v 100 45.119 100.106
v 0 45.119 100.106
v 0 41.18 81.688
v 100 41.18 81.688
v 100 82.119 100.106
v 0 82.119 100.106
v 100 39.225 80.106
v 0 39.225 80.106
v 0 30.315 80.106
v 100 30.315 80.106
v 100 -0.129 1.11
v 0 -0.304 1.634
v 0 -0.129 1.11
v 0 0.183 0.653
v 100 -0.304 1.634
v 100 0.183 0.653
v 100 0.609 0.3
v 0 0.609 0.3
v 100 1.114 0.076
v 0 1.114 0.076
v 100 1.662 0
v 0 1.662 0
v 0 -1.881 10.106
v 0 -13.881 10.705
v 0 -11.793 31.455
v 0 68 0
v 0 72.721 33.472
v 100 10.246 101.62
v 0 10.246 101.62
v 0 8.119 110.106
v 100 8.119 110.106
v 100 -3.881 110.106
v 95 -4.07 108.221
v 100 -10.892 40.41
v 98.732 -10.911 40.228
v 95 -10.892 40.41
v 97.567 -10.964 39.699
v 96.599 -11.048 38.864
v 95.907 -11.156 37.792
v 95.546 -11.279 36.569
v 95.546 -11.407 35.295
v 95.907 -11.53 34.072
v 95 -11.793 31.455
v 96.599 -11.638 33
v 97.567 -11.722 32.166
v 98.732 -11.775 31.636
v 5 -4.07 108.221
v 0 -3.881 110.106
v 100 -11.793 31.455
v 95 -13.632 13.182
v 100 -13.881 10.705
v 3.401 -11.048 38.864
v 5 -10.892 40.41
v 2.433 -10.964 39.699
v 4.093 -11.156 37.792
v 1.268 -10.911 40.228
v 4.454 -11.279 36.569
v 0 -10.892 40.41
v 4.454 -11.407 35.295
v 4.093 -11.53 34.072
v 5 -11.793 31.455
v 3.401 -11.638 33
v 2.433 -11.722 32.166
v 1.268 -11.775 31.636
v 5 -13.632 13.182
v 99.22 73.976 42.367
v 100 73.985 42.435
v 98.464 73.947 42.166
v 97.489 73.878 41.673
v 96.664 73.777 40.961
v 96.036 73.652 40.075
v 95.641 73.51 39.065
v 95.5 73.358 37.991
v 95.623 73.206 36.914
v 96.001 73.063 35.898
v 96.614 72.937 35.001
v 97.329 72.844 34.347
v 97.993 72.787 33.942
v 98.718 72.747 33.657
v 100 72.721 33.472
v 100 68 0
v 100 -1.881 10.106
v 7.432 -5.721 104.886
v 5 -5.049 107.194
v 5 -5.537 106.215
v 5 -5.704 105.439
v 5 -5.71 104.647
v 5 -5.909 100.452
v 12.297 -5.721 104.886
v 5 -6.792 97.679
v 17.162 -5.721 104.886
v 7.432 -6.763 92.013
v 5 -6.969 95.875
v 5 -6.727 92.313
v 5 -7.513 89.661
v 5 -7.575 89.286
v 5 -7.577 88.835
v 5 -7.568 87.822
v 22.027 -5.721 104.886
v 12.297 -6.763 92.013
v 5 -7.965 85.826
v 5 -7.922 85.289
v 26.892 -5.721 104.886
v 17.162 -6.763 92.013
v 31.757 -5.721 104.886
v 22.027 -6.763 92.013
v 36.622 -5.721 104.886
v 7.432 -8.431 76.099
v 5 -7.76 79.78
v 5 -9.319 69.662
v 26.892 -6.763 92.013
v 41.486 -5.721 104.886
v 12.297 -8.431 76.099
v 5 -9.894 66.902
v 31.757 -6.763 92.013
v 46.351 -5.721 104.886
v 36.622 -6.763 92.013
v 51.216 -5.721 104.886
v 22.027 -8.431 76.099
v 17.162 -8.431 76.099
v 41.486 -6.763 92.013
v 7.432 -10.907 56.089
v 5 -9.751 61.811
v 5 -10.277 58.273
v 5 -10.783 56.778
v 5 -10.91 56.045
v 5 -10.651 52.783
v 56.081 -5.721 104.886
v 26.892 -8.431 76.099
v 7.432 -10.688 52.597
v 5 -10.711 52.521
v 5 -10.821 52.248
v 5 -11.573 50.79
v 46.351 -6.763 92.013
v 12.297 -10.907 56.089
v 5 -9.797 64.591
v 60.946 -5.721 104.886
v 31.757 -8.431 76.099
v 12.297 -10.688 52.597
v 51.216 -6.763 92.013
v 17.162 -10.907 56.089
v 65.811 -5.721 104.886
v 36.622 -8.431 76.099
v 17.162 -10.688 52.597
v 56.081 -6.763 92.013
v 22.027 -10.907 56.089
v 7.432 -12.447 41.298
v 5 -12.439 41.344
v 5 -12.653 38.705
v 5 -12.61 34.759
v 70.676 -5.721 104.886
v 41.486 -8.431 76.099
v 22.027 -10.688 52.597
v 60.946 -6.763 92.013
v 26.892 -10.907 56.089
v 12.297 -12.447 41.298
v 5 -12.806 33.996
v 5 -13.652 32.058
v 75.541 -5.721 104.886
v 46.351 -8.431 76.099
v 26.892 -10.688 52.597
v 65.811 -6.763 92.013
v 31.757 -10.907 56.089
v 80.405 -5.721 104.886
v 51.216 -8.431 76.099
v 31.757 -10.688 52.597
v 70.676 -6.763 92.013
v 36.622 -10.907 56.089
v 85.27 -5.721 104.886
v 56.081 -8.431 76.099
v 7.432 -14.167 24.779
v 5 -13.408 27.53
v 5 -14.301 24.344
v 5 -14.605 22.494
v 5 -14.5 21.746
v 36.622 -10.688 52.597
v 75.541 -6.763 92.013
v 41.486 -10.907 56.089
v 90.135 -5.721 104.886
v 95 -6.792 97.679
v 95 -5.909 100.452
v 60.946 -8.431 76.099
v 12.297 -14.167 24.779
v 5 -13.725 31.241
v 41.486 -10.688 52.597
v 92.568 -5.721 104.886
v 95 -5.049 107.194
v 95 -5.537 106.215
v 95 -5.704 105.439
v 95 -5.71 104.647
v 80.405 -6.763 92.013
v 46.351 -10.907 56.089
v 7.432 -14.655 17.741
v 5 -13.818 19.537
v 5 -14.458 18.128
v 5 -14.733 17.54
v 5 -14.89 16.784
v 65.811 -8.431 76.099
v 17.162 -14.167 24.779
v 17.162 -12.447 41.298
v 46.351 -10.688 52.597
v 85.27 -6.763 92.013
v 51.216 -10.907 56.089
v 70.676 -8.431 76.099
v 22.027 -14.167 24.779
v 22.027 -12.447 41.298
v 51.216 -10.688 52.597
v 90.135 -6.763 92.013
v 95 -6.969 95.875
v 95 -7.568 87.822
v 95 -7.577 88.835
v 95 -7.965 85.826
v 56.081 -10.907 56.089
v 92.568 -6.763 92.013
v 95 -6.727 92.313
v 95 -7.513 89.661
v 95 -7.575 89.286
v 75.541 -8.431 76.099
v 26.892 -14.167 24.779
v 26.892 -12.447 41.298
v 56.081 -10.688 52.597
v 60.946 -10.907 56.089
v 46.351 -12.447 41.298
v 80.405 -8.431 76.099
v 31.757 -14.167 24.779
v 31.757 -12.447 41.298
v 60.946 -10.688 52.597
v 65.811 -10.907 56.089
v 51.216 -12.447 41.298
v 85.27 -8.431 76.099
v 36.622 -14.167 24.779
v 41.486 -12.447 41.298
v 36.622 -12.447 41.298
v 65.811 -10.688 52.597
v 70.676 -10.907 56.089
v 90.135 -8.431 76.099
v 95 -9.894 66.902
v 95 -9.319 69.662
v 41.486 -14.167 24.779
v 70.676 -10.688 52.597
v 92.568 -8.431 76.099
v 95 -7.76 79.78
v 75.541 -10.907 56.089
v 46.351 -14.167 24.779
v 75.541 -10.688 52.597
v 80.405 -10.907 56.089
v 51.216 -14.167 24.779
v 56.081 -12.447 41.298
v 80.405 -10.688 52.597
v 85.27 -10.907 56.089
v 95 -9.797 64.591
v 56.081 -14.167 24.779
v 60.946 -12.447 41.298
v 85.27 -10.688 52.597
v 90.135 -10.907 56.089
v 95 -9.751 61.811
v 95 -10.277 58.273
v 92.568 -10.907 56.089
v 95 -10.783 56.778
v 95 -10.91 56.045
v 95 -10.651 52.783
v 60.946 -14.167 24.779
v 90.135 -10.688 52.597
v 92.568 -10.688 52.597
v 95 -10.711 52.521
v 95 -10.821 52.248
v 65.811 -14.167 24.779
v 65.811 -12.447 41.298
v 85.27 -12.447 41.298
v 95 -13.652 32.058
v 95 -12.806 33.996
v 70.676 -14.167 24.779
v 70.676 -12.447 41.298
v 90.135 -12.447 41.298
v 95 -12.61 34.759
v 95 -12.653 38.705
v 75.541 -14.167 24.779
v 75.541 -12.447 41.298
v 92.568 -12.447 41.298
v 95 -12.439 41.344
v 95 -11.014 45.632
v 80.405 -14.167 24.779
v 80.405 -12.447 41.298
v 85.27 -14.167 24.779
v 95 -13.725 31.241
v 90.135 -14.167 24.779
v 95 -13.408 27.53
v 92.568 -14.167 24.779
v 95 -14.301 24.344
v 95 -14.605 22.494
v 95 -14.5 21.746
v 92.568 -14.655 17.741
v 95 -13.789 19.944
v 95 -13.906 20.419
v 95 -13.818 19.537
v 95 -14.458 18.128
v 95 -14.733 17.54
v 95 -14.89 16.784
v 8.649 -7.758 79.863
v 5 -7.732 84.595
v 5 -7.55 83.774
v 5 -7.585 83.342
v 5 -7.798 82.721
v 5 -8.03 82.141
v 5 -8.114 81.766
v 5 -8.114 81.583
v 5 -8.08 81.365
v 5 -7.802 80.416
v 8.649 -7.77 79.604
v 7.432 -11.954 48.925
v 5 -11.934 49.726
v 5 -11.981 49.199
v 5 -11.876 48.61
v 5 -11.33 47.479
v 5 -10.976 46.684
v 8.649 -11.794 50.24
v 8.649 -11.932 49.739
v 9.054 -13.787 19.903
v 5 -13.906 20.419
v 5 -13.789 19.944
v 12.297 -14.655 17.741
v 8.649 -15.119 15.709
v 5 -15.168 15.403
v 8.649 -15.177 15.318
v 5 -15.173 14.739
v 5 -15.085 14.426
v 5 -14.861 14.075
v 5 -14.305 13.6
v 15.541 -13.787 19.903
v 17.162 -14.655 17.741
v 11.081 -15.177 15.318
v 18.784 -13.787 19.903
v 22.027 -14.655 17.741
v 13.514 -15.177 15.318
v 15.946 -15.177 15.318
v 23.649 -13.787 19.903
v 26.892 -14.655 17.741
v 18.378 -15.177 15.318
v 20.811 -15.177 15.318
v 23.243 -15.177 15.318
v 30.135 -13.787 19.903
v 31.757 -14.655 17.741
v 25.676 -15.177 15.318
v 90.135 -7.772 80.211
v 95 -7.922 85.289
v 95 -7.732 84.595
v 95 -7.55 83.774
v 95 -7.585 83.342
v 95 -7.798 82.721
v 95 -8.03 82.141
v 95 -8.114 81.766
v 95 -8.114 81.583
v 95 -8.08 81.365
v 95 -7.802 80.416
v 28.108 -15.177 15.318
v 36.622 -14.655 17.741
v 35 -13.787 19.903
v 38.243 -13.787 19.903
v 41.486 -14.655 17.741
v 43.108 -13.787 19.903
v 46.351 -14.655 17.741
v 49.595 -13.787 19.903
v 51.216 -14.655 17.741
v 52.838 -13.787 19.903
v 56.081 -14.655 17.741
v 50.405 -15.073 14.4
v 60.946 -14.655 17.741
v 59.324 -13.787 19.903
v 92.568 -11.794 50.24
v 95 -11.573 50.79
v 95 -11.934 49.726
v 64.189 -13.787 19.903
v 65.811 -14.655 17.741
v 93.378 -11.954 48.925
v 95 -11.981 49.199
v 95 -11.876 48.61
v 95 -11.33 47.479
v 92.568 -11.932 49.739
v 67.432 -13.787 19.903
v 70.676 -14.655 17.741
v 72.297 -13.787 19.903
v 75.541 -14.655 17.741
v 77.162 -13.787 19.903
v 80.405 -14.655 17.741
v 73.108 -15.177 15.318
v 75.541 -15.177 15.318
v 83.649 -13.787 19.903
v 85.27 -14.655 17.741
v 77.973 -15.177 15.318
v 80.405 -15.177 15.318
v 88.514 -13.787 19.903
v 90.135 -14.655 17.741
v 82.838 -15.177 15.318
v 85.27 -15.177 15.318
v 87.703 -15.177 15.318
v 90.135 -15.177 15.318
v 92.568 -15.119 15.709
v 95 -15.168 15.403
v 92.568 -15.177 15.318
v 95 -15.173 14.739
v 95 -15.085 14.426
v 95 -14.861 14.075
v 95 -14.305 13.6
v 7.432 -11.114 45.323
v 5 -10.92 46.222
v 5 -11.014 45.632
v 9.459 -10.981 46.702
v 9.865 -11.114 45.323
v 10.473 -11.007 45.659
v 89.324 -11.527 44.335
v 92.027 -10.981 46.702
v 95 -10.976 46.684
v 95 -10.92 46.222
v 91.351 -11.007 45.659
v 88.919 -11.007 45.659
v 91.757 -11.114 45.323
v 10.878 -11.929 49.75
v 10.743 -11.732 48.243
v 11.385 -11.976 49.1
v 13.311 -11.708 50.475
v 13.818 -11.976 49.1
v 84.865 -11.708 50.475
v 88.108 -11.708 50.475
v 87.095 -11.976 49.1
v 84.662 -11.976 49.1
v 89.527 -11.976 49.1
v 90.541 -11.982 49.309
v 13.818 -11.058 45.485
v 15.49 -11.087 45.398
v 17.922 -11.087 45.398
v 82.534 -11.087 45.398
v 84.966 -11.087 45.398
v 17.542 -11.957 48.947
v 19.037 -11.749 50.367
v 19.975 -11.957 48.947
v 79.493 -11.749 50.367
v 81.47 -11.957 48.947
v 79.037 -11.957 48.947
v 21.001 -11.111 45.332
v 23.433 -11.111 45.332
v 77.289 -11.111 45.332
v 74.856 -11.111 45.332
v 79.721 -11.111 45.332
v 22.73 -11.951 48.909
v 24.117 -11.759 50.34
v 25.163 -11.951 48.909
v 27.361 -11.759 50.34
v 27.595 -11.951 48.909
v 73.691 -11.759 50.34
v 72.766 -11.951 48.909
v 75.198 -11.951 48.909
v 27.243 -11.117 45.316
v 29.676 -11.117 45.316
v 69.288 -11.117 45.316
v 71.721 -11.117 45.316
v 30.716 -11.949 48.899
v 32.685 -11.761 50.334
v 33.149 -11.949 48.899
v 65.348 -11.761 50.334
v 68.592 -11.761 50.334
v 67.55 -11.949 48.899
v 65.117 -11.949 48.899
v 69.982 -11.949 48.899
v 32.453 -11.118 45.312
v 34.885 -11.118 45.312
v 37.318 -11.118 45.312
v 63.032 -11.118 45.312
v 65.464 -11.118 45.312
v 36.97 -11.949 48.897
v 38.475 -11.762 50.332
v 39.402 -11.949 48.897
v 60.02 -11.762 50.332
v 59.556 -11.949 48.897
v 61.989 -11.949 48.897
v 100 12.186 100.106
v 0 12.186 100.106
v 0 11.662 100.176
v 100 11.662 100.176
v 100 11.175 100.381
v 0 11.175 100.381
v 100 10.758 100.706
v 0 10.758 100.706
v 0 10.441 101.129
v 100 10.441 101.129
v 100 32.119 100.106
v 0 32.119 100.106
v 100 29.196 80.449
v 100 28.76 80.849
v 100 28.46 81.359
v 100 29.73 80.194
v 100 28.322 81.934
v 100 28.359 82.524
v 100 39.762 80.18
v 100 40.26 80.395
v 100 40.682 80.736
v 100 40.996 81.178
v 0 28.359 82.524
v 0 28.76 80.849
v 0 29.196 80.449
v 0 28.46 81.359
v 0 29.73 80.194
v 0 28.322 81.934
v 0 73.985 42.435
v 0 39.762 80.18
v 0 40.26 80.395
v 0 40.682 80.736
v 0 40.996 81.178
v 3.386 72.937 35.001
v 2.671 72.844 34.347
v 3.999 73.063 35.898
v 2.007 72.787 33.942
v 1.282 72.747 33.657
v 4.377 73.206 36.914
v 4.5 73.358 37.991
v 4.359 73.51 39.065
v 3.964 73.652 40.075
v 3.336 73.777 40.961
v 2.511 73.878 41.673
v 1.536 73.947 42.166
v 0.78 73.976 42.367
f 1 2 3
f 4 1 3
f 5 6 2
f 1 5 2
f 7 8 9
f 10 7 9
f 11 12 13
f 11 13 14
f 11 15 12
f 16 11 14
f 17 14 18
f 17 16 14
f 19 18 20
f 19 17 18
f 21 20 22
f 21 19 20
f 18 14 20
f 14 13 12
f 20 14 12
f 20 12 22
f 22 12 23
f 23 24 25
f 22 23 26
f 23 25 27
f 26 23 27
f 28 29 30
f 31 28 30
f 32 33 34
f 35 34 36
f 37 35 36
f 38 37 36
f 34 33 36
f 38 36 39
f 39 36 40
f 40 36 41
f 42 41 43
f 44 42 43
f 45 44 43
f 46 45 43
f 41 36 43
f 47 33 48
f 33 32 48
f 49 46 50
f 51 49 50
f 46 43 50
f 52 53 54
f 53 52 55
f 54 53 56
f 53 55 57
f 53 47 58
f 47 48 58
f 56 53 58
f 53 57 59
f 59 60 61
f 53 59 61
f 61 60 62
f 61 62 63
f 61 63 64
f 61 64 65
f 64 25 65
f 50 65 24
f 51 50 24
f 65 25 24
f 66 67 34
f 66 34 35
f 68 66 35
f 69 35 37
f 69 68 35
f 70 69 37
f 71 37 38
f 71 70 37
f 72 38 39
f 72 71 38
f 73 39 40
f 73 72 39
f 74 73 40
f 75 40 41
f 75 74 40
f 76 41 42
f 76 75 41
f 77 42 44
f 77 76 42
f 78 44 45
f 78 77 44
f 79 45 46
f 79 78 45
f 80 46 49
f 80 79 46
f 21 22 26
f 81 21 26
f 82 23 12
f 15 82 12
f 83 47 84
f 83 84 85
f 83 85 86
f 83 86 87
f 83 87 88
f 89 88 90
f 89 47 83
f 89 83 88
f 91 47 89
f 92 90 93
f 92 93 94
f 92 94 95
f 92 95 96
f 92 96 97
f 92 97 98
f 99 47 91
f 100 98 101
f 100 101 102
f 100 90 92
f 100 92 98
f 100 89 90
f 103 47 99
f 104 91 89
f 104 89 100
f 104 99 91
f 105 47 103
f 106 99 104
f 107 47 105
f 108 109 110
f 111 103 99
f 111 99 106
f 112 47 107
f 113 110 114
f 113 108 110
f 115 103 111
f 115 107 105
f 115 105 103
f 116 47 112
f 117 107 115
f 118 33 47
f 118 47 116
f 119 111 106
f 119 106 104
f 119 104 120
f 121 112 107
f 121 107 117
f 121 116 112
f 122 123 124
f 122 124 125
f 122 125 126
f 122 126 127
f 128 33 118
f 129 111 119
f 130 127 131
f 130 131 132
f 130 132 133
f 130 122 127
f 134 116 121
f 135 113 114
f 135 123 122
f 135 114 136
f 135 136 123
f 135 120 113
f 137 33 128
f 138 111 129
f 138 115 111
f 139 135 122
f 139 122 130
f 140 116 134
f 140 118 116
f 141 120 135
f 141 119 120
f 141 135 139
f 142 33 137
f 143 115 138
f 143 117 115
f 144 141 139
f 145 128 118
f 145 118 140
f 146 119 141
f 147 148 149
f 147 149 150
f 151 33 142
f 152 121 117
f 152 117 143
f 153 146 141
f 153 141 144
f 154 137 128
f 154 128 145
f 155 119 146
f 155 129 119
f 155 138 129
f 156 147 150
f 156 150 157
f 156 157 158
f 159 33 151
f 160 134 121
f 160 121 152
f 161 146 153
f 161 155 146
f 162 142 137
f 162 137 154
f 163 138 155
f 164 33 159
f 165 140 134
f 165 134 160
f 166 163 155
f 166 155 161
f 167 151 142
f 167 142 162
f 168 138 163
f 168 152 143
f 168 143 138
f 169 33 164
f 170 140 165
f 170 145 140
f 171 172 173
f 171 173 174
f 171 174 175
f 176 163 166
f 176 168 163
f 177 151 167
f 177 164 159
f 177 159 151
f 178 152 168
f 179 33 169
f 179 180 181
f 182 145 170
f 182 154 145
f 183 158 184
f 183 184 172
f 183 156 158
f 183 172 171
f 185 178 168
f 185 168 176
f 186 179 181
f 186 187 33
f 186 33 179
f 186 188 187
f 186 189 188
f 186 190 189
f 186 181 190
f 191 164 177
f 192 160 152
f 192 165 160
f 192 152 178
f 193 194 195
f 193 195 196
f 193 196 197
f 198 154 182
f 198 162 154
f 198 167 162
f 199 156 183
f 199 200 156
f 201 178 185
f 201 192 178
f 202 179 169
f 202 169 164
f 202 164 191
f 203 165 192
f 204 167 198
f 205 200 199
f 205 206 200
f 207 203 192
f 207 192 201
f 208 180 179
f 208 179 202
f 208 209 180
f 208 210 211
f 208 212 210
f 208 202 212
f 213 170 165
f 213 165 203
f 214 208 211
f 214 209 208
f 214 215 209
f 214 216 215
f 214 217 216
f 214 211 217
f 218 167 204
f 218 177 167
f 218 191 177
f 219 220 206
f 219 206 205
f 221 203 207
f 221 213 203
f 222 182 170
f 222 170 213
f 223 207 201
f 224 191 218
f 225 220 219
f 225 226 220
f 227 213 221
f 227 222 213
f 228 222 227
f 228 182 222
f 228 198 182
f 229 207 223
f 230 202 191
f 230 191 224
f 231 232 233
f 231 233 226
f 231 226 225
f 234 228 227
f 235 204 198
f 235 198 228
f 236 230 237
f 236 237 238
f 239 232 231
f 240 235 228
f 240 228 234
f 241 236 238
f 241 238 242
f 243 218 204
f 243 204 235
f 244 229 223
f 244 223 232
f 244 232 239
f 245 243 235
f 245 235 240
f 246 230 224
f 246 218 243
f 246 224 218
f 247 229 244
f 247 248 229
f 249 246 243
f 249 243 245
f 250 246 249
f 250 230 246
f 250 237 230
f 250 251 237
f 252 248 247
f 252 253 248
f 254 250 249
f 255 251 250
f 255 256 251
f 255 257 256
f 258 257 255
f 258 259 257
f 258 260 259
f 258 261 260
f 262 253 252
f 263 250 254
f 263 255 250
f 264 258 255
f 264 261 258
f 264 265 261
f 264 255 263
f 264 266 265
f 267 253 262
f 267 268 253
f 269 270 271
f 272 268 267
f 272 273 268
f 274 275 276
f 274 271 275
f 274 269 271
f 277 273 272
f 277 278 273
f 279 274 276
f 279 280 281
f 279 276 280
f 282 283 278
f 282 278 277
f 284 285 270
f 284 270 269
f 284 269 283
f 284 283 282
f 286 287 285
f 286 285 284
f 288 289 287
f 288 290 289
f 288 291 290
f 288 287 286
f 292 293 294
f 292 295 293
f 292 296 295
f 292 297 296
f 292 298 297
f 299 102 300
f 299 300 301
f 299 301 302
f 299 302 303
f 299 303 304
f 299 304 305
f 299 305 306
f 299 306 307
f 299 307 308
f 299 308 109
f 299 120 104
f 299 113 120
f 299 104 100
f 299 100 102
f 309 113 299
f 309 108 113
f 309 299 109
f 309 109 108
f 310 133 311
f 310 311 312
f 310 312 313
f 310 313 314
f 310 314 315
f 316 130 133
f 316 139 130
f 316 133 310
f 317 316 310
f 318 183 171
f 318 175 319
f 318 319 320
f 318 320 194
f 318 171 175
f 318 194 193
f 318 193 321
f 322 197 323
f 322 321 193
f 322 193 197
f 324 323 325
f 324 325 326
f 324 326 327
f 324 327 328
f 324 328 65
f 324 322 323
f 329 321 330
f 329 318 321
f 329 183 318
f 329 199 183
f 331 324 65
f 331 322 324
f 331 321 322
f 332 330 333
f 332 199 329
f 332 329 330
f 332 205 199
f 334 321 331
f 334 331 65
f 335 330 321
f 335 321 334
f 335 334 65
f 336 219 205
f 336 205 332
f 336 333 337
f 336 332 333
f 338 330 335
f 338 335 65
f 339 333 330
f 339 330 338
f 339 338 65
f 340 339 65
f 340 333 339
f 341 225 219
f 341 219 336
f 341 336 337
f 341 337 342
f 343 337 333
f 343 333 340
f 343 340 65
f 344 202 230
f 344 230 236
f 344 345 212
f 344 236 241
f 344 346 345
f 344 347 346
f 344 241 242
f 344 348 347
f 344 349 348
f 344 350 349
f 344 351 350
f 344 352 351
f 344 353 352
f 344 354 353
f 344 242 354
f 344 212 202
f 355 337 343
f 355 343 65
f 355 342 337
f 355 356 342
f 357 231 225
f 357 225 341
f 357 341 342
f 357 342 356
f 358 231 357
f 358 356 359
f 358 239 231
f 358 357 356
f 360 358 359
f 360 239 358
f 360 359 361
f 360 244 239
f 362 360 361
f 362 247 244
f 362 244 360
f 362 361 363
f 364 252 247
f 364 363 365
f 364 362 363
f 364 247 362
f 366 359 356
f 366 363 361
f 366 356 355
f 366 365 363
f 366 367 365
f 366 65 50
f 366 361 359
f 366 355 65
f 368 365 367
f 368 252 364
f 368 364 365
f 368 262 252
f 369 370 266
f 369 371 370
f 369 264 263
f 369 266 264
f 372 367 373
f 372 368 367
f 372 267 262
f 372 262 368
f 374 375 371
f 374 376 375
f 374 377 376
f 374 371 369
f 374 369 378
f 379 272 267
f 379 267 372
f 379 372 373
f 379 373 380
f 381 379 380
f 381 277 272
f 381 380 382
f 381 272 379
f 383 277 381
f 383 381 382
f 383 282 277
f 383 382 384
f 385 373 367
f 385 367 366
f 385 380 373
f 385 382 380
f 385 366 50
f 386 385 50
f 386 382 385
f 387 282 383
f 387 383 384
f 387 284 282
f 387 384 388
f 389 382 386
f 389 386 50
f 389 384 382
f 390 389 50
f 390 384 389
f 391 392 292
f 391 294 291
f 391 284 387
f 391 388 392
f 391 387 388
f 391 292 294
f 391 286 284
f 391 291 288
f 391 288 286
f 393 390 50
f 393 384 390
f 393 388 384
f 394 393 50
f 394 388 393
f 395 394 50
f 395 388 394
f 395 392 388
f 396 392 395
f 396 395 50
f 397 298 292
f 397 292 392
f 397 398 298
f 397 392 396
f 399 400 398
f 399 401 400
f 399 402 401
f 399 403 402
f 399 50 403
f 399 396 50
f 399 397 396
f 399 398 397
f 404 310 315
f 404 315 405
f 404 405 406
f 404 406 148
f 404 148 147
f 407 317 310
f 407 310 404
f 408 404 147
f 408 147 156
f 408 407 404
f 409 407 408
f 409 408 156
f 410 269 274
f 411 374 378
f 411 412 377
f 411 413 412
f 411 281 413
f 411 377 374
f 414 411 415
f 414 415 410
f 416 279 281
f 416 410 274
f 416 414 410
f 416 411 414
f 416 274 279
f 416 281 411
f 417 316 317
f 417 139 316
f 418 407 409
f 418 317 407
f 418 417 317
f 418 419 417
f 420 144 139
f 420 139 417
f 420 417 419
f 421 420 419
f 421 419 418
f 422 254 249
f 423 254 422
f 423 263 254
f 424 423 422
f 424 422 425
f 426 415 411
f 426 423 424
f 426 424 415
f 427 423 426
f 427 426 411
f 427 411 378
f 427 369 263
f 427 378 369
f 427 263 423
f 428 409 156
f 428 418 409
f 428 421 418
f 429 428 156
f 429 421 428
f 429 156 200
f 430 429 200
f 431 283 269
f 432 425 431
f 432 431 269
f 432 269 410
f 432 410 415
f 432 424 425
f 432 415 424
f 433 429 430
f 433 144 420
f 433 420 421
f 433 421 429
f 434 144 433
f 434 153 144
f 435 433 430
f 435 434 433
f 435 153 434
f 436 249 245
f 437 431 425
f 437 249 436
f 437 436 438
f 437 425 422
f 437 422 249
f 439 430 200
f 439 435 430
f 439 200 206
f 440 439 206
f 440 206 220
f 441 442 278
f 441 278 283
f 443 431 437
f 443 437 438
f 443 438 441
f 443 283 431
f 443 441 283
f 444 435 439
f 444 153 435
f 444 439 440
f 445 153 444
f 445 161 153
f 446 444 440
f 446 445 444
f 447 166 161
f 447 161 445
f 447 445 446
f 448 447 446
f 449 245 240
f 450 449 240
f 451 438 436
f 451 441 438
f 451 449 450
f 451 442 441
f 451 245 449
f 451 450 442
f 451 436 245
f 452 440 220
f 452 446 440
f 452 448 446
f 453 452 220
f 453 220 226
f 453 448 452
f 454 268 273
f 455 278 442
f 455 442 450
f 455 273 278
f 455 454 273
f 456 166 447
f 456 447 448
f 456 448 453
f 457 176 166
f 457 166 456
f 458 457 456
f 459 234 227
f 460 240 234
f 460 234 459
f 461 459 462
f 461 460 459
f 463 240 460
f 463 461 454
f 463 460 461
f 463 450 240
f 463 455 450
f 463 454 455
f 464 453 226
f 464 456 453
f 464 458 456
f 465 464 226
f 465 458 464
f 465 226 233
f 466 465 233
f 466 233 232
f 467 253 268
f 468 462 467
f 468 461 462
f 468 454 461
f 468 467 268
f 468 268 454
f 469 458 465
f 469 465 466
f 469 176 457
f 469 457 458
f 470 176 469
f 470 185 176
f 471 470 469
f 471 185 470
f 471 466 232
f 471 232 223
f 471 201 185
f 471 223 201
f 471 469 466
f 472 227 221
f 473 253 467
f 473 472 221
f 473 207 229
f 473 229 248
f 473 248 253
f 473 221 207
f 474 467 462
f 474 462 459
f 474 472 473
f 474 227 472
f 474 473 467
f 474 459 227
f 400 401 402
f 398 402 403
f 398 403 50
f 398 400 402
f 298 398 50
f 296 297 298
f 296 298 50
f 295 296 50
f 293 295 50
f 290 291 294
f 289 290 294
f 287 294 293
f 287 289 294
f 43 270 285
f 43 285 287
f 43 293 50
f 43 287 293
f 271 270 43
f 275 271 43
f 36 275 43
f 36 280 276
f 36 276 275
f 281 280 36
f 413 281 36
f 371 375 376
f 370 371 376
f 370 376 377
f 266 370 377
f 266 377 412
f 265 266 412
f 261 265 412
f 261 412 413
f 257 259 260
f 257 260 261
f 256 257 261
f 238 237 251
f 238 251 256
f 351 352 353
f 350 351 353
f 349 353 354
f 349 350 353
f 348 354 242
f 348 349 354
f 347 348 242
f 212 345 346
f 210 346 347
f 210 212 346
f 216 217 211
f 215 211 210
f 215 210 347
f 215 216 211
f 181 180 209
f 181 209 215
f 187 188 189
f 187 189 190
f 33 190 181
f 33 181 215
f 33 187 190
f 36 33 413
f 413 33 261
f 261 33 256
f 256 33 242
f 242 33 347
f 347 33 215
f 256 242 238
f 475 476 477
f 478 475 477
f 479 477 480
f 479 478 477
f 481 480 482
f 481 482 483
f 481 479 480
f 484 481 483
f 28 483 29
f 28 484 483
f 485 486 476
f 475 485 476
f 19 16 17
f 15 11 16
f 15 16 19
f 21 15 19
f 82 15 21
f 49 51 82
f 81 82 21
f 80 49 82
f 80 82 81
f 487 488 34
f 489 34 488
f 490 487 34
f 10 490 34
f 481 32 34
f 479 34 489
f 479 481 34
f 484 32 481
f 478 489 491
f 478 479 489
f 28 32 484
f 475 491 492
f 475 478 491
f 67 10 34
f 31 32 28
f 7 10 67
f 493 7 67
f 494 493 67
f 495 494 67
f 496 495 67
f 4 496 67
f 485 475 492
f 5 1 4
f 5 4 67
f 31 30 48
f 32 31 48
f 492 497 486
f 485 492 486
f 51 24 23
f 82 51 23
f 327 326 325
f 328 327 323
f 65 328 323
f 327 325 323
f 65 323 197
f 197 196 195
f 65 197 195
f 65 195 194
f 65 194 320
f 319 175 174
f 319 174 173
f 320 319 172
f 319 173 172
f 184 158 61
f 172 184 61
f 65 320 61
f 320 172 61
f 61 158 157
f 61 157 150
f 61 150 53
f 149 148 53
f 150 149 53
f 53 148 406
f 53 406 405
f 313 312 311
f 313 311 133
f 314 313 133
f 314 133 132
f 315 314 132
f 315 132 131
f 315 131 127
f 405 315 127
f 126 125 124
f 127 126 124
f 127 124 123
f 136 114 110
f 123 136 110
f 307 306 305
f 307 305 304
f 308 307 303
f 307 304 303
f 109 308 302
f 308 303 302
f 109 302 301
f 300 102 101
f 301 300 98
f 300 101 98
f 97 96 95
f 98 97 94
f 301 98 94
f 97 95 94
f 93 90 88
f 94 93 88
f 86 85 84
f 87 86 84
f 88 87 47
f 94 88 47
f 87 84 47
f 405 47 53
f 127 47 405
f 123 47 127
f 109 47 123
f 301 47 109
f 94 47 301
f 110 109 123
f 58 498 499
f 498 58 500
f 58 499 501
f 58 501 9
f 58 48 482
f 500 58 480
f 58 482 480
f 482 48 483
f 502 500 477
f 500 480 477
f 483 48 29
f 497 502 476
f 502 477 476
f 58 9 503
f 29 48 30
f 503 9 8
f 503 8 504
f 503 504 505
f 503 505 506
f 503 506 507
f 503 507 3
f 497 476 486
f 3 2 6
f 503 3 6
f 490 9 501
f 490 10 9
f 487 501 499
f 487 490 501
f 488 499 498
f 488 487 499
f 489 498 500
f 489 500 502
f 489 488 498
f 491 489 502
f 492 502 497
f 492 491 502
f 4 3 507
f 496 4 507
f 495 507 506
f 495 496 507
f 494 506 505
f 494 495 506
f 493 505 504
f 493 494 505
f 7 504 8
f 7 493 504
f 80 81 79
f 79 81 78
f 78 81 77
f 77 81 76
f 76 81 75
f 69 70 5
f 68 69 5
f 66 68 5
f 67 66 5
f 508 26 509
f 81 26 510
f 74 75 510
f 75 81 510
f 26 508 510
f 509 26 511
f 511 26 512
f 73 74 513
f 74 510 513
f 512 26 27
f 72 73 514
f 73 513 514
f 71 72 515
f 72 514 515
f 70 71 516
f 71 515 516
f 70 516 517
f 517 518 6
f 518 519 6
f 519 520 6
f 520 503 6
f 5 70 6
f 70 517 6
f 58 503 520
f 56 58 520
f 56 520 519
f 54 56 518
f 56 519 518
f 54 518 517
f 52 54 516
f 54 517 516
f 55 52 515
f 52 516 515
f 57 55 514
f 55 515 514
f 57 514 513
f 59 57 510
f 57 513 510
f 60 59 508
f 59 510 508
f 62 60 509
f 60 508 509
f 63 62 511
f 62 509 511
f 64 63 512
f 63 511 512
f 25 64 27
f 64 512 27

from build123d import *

# Parameters (mm, degrees)
F1_DEPTH  = 100
F2_R      = 2
F11_DEPTH = 90


with BuildPart() as f1:
    # F0 (on Right) → F1 (new body)
    with BuildSketch(Plane.YZ):
        Polygon((-1.8808243613, 10.1062467694), (0, 0), (68, 0), (82.1191756387, 100.1062467694), (45.1191756387, 100.1062467694), (40.842129928, 80.1062467694), (27.842129928, 80.1062467694), (32.1191756387, 100.1062467694), (10.6257721782, 100.1062467694), (8.1191756387, 110.1062467694), (-3.8808243613, 110.1062467694), (-13.8808243613, 10.7048012534), align=None)
    extrude(amount=F1_DEPTH)

    # F2
    f2_edges = [f1.edges().sort_by_distance(p)[0] for p in [
        (50, 10.625772, 100.106247),
        (50, 27.84213, 80.106247),
        (50, 40.84213, 80.106247),
        (50, 0, 0),
    ]]
    fillet(f2_edges, radius=F2_R)

    # F7: F5 across plane


with BuildPart() as f5:
    # F5: sweep along a path in F3
    with BuildLine(Plane.YZ.offset(100)) as f5_path:
        Line((-11.3428942395, 35.9321935264), (89.6662888766, 38.3427343632))
    # F4 (on face) → F5 (sweep)
    with BuildSketch(Plane(origin=(0, -14.8078829384, 1.4897049899), x_dir=(1, 0, 0), z_dir=(0, -0.9949776931, 0.1000969038))):
        with BuildLine():
            Line((100, 30.1163424306), (100, 34.6163424306))
            Line((100, 34.6163424306), (100, 39.1163424306))
            ThreePointArc((100, 39.1163424306), (95.5, 34.6163424306), (100, 30.1163424306))
        make_face()
    sweep(path=f5_path.line)


with BuildPart() as f1_1:
    add(f1.part)
    add(f5.part.mirror(Plane(origin=(50, 32.6792061975, 50.8936948359), x_dir=(0, 1, 0), z_dir=(-1, 0, 0))), mode=Mode.SUBTRACT)

    # F8: cut F5
    add(f5.part, mode=Mode.SUBTRACT)

    # F10 (on offset) → F11 (join)
    with BuildSketch(Plane.YZ.offset(95)):
        with BuildLine():
            Line((-10.8924581723, 40.4095931455), (-4.0704451453, 108.2213887669))
            add(Edge.make_bspline(
                [(-4.0704451453, 108.2213887669), (-5.2818750987, 107.2652325923), (-5.8062226875, 105.5557023979), (-5.658021607, 104.2903504465), (-5.5834659955, 100.7172156397), (-6.7699177117, 98.254071368), (-7.1558295463, 95.6356202608), (-6.3166292081, 92.0143031231), (-7.8306933622, 89.5396988158), (-7.3252736764, 87.8793605238), (-8.3604343376, 85.5755017553), (-7.1049285811, 83.6049578304), (-8.4935079911, 81.7393134187), (-7.3477812132, 80.1725871686), (-8.7233950038, 76.0306096961), (-8.7705557834, 70.8095994077), (-9.9023105275, 68.236379614), (-9.9619352212, 65.2852635456), (-9.5367496656, 63.4152571815), (-10.0559760456, 58.0593808128), (-11.2170759932, 56.3241743932), (-10.5007244312, 53.1310801328), (-10.8010516507, 52.1068044028), (-12.76595245, 49.0200741426), (-10.3956962967, 46.6561944579), (-11.6157032129, 44.3204280643), (-12.6232007158, 41.2855192815), (-12.7155192329, 37.6896680406), (-12.3240120389, 34.2159943916), (-14.0174805543, 32.1622311957), (-13.4617073995, 29.5054383825), (-13.2686685319, 27.1262388048), (-14.2253981122, 24.8434715764), (-14.9813315476, 21.759428345), (-13.2054762946, 19.9035363997), (-14.840411162, 17.7279465808), (-14.8303141567, 16.6638532036), (-15.6004805739, 14.2904216029), (-14.2660826735, 13.5655737252), (-13.6316515739, 13.1816147791)],
                knots=[0, 0, 0, 0, 0.0298790956, 0.0486591617, 0.0797614677, 0.1078401931, 0.1348767888, 0.1669529447, 0.1943591686, 0.2156662325, 0.2412468, 0.2654697964, 0.2885853345, 0.3095808828, 0.3440845249, 0.3829044138, 0.4111943409, 0.4387456308, 0.4630916204, 0.5011304057, 0.5263168116, 0.5549263228, 0.5731197857, 0.6029084417, 0.6307218007, 0.656172368, 0.6863605943, 0.71862124, 0.7494581432, 0.7755236663, 0.8023791425, 0.8281401763, 0.8547683802, 0.8838004488, 0.9084096344, 0.9336508444, 0.9518443215, 0.9761402593, 1, 1, 1, 1], degree=3))
            Line((-13.6316515739, 13.1816147791), (-11.7933303067, 31.4547939073))
            Line((-11.7933303067, 31.4547939073), (-10.8924581723, 40.4095931455))
        make_face()
    extrude(amount=-F11_DEPTH)


solid = f1_1.part
